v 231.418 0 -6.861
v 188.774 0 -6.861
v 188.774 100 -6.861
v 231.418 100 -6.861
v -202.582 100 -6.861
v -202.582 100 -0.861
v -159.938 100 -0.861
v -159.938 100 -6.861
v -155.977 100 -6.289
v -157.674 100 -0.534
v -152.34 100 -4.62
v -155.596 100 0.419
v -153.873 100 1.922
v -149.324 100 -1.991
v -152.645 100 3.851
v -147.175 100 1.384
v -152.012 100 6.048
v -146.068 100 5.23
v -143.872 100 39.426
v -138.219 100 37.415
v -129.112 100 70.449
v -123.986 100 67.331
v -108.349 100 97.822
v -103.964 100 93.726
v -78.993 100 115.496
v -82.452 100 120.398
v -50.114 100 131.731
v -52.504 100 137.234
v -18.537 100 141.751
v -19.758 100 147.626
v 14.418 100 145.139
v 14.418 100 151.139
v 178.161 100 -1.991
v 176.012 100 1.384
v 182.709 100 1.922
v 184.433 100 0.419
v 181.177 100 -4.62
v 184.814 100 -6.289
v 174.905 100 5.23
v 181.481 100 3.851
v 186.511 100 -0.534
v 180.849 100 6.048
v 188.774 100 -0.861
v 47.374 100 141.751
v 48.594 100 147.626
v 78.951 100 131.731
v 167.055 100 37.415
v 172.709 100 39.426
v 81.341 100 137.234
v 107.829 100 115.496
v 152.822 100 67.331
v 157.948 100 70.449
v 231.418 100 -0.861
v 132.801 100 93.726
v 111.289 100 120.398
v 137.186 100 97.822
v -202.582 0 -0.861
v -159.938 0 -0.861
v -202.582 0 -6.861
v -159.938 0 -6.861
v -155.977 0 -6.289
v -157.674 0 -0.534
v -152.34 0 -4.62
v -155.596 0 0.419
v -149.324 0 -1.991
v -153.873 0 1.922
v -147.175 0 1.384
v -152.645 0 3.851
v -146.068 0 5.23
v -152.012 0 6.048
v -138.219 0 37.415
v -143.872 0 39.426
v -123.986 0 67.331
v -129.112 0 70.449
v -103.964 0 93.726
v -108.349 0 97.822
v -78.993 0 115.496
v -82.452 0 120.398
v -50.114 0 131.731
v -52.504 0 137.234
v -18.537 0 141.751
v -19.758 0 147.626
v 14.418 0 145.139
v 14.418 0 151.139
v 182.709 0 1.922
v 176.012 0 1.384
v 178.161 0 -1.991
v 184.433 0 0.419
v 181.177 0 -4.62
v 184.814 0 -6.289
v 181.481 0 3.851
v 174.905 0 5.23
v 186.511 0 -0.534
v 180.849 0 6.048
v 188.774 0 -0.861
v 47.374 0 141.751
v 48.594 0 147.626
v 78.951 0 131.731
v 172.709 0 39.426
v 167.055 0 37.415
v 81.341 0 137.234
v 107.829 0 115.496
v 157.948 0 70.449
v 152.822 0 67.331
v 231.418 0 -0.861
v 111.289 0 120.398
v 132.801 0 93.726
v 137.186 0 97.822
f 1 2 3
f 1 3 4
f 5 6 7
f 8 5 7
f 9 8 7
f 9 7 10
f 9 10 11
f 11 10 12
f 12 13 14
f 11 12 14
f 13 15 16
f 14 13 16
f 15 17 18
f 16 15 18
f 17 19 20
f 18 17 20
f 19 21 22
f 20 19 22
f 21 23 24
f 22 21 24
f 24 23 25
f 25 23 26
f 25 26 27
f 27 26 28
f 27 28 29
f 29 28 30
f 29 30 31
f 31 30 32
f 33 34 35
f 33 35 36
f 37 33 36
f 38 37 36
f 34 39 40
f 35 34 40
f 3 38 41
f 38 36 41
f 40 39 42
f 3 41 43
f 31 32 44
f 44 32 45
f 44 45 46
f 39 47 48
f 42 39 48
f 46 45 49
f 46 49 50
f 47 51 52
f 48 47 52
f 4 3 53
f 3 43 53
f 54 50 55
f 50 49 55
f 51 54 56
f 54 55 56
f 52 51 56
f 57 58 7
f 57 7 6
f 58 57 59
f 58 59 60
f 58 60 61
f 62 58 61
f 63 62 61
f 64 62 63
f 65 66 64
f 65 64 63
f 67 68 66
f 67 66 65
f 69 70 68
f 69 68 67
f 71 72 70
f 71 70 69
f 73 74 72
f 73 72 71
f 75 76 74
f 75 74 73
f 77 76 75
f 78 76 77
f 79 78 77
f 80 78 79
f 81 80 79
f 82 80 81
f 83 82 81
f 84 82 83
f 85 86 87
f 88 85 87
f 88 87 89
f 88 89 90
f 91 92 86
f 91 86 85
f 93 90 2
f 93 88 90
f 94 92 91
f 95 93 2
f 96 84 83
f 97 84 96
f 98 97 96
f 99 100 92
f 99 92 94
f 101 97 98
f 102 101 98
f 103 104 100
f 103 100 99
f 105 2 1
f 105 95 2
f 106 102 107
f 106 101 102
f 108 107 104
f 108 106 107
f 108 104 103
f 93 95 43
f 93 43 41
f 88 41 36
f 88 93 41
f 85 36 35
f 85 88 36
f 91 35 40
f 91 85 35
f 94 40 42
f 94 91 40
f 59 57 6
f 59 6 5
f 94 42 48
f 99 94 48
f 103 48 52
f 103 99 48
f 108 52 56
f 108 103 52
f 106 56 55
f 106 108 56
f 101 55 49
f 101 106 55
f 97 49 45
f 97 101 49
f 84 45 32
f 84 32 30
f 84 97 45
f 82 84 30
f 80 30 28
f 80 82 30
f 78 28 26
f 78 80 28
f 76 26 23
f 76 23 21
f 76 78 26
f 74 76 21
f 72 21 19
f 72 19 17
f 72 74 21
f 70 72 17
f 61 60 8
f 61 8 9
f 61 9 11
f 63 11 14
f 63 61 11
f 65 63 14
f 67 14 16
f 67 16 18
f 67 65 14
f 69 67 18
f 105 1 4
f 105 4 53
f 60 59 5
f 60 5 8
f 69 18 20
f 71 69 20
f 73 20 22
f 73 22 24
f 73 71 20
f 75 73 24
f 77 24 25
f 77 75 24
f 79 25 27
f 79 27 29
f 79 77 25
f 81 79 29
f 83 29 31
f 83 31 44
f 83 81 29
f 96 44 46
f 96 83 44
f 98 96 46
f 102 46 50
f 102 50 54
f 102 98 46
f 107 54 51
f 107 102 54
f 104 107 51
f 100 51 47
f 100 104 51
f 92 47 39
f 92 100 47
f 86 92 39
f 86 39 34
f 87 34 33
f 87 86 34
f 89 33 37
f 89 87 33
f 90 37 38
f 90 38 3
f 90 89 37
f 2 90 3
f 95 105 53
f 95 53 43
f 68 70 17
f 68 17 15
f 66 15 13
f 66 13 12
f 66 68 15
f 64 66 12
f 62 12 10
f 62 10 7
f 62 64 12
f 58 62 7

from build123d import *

# Parameters (mm, degrees)
F1_DEPTH = 100


with BuildPart() as f1:
    # F0 (on Front) → F1 (new body)
    with BuildSketch(Plane.XZ):
        with BuildLine():
            ThreePointArc((-146.068349, 5.22981), (14.418385, 145.138901), (174.905118, 5.22981))
            ThreePointArc((174.905118, 5.22981), (179.57454, -3.413996), (188.774342, -6.861099))
            Line((188.774342, -6.861099), (231.418385, -6.861099))
            Line((231.418385, -6.861099), (231.418385, -0.861099))
            Line((231.418385, -0.861099), (188.774342, -0.861099))
            ThreePointArc((188.774342, -0.861099), (183.517312, 1.108674), (180.849072, 6.047992))
            ThreePointArc((180.849072, 6.047992), (14.418385, 151.138901), (-152.012302, 6.047992))
            ThreePointArc((-152.012302, 6.047992), (-154.680543, 1.108674), (-159.937573, -0.861099))
            Line((-159.937573, -0.861099), (-202.581615, -0.861099))
            Line((-202.581615, -0.861099), (-202.581615, -6.861099))
            Line((-202.581615, -6.861099), (-159.937573, -6.861099))
            ThreePointArc((-159.937573, -6.861099), (-150.737771, -3.413996), (-146.068349, 5.22981))
        make_face()
    extrude(amount=-F1_DEPTH)


solid = f1.part
